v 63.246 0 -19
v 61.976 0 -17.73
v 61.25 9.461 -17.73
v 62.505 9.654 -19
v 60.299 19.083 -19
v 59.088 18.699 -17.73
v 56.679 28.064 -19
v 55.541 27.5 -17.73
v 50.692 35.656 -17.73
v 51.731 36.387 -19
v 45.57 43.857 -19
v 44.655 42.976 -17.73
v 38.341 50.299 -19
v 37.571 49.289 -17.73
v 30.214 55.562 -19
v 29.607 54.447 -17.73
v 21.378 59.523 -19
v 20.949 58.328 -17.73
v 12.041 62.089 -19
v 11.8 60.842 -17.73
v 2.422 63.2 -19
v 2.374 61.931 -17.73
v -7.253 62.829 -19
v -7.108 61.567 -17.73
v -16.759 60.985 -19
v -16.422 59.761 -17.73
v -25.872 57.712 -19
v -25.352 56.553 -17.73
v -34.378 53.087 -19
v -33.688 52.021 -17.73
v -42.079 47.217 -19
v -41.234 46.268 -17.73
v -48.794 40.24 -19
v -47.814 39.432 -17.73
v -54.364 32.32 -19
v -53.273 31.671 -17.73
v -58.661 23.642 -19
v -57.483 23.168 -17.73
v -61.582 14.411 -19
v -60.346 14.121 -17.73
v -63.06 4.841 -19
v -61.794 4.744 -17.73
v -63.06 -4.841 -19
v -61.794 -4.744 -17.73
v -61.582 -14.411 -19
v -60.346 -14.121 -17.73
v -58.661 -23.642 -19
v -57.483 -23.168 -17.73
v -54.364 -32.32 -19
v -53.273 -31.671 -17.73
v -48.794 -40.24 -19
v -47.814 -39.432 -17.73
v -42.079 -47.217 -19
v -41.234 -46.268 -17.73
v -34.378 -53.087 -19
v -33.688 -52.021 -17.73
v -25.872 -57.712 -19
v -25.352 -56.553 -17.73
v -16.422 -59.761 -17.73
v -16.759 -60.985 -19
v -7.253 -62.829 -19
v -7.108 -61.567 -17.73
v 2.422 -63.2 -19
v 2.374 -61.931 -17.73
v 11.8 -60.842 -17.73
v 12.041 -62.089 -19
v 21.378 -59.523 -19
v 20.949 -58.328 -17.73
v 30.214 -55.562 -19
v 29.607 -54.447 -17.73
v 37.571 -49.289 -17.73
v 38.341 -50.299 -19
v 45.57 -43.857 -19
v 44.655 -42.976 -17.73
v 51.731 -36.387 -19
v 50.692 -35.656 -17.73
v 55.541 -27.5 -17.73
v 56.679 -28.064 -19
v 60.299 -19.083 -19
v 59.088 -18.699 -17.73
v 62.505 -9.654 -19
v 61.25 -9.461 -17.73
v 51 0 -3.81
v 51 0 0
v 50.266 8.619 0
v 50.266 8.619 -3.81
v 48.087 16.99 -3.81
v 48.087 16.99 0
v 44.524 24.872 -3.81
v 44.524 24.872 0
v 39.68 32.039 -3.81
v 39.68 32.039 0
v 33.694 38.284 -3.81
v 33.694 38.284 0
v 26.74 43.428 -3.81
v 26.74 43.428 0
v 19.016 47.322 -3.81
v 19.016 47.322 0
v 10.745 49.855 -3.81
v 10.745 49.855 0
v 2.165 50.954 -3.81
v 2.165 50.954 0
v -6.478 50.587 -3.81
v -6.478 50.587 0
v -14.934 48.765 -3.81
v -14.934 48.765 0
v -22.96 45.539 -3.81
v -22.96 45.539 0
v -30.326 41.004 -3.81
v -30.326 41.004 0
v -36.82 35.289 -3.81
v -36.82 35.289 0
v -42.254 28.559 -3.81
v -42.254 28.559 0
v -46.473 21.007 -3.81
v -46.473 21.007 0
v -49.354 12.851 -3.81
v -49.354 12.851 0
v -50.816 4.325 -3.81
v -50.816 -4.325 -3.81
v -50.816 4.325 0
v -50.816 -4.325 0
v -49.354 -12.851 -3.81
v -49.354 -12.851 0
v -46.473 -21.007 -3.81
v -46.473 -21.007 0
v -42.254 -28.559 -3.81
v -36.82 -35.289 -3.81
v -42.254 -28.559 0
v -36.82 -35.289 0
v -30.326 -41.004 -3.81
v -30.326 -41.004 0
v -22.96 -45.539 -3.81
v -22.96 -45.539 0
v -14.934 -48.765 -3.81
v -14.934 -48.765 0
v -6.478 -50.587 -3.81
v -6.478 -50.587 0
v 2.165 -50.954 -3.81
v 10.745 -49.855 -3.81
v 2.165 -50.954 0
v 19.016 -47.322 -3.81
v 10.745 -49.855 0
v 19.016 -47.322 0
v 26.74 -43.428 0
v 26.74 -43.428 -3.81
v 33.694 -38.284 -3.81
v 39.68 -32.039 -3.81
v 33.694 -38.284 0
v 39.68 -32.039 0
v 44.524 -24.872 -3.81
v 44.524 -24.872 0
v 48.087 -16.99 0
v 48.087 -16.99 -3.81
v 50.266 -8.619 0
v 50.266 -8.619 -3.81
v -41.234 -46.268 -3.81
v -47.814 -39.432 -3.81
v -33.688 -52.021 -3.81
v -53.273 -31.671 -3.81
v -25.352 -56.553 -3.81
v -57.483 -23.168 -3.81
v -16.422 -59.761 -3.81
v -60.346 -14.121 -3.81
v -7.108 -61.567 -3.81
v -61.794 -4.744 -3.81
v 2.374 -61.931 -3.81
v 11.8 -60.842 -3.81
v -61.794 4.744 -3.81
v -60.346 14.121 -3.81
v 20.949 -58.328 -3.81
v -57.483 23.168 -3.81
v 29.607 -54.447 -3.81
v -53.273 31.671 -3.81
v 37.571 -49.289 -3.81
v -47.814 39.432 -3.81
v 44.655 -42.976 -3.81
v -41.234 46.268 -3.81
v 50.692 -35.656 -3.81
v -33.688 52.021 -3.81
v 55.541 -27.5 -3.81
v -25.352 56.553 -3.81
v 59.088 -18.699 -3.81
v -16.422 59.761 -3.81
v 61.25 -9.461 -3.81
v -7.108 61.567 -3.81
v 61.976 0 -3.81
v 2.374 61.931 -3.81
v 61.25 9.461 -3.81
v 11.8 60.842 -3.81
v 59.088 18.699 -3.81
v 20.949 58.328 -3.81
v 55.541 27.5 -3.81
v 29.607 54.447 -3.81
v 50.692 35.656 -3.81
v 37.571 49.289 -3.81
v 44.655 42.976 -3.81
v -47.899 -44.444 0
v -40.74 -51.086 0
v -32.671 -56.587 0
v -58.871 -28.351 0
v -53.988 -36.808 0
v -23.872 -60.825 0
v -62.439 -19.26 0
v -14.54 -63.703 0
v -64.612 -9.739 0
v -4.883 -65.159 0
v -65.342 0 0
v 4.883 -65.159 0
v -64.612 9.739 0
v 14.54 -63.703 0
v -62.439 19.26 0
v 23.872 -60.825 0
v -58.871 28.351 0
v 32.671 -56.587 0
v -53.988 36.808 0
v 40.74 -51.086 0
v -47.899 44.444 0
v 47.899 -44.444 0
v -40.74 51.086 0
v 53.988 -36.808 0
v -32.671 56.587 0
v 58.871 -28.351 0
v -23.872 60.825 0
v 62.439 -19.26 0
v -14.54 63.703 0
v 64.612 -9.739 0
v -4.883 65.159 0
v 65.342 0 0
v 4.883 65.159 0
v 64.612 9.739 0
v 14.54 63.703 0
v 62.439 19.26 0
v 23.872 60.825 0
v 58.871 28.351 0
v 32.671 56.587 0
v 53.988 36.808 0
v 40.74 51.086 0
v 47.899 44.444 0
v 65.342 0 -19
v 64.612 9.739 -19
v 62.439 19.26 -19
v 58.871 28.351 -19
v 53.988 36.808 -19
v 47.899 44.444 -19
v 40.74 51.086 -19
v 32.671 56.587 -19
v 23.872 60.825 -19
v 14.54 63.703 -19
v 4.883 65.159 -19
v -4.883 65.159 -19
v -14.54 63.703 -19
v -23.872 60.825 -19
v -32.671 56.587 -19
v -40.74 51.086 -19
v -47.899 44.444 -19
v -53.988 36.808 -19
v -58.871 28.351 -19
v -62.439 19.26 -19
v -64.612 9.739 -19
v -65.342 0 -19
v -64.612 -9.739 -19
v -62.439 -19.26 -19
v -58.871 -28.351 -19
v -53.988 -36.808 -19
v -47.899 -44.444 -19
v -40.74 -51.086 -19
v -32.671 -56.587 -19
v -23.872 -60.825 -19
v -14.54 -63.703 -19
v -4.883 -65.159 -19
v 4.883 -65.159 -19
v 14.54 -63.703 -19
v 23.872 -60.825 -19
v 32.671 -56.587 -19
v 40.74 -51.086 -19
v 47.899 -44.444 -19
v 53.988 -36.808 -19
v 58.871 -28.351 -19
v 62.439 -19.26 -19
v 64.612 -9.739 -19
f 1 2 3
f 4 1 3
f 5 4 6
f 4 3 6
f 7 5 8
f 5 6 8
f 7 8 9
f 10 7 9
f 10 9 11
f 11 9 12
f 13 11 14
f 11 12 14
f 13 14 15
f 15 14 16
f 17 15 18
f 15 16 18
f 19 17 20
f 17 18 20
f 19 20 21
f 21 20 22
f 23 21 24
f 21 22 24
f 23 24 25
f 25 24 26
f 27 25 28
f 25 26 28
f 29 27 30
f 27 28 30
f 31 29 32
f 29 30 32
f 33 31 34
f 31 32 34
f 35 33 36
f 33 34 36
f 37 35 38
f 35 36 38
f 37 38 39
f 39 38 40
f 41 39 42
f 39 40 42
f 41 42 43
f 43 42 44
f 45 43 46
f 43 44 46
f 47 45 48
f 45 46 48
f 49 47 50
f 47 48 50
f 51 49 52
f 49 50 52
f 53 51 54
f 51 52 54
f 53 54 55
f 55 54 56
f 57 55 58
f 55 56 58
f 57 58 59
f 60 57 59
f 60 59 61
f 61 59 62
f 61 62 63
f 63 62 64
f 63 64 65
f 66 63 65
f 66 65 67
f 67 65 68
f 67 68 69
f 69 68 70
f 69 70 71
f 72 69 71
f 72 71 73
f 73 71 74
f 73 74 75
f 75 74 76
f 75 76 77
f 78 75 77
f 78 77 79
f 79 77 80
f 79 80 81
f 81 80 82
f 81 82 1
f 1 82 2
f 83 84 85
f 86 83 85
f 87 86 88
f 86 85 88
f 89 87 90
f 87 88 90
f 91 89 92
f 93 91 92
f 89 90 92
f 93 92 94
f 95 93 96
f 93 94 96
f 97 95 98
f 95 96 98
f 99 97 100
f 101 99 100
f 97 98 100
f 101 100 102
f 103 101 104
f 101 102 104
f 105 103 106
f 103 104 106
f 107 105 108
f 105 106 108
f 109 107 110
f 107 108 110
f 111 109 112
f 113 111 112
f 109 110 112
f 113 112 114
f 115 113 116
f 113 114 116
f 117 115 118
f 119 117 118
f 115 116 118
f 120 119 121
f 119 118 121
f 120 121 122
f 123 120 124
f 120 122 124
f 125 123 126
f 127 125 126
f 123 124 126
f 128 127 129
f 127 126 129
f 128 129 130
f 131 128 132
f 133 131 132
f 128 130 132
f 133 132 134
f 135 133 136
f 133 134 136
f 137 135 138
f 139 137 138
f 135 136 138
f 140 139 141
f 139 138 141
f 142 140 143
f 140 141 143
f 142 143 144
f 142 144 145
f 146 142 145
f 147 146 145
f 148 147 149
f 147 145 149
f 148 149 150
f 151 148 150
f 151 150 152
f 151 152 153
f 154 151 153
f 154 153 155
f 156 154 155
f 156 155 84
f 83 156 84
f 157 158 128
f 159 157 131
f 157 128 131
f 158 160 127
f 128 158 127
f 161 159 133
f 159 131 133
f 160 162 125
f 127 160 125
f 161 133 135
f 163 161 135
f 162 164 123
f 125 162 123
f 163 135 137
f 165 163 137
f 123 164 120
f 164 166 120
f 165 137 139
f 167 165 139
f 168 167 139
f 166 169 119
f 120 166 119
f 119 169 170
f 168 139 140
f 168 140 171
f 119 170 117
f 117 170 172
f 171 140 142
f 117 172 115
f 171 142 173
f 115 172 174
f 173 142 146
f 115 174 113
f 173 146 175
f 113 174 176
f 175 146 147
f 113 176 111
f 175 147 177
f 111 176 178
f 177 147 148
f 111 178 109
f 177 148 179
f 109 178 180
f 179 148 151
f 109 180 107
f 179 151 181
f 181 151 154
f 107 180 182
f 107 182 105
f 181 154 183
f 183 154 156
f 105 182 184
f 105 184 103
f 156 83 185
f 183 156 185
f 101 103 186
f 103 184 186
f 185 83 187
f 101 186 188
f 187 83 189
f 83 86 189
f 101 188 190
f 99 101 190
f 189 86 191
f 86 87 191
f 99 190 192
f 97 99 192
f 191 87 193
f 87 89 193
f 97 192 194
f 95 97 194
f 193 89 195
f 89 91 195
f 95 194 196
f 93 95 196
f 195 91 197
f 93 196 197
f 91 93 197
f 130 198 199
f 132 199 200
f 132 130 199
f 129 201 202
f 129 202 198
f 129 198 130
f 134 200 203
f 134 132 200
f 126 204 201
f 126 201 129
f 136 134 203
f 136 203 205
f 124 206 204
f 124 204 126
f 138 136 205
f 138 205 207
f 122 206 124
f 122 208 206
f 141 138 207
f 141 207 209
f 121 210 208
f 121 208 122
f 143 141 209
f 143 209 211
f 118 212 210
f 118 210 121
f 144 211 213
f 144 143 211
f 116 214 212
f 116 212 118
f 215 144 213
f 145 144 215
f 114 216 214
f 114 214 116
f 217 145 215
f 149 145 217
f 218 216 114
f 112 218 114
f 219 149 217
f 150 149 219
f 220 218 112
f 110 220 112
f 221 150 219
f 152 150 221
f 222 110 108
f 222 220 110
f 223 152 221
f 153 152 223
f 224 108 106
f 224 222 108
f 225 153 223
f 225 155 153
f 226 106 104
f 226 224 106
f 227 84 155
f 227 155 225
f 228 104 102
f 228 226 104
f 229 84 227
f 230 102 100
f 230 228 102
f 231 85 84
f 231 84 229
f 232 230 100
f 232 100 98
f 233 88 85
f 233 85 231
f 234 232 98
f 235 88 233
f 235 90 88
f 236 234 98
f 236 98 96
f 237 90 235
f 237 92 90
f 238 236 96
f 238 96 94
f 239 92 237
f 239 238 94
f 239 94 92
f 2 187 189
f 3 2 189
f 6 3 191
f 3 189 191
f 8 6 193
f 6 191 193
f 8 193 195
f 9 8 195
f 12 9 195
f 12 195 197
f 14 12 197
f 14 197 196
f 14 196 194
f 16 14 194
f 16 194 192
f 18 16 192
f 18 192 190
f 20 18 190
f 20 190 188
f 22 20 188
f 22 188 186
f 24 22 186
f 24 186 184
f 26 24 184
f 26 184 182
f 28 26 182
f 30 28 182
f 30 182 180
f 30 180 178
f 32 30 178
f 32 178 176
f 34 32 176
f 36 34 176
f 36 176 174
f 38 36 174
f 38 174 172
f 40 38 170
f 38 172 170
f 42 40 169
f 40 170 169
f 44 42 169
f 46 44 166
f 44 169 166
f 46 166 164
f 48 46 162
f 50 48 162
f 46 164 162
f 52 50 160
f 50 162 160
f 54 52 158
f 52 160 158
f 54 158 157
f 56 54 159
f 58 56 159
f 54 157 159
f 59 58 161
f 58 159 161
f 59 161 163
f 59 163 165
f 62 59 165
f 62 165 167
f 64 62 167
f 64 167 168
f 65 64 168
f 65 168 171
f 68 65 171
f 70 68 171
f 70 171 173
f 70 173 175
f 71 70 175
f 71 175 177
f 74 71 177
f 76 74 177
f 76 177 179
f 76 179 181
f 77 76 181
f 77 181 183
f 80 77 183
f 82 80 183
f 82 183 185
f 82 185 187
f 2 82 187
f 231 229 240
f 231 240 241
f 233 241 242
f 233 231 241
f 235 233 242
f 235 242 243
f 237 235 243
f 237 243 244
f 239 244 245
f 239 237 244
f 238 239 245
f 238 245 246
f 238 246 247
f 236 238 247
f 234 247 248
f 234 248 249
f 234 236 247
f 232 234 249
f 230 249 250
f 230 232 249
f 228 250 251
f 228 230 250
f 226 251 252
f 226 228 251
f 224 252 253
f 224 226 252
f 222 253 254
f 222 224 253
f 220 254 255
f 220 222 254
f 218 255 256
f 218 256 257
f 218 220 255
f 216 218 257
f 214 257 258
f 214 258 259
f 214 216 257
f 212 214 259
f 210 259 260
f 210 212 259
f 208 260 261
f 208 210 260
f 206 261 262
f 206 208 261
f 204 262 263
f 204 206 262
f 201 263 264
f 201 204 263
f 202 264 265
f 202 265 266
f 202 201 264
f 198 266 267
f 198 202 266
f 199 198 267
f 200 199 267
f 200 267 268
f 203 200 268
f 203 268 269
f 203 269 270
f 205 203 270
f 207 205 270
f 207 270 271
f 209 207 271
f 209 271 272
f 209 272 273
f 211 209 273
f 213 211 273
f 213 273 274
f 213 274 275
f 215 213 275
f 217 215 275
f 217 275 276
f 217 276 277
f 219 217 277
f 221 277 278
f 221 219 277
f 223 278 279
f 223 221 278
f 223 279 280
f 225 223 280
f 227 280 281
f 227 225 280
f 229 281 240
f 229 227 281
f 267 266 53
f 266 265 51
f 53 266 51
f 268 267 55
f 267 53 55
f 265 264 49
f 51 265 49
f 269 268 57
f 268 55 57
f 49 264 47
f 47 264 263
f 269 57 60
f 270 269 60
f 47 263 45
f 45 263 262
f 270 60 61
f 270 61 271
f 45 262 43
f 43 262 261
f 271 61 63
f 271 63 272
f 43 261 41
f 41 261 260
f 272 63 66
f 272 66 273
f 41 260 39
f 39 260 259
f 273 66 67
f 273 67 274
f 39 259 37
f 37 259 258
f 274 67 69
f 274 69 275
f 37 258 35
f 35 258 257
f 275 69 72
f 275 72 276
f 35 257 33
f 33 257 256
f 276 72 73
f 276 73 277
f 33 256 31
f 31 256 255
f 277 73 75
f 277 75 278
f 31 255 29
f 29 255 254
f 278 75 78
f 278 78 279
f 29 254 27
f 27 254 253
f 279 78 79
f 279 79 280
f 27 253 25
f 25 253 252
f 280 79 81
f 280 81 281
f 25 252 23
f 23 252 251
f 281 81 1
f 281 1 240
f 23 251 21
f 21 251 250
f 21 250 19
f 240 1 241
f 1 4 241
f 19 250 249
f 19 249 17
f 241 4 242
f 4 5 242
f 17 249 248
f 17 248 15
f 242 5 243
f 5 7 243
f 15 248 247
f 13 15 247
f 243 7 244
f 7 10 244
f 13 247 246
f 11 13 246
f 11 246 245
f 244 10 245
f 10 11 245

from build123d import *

# Parameters (mm, degrees)
F0_R     = 64.77
F0_R_2   = 51
F1_DEPTH = 3.81
F2_R     = 65.3415
F2_R_2   = 61.976
F3_DEPTH = 19
F4_SIZE  = 1.27


with BuildPart() as f1:
    # F0 (on Top) → F1 (new body)
    with BuildSketch(Plane.XY):
        Circle(F0_R)
        Circle(F0_R_2, mode=Mode.SUBTRACT)
    extrude(amount=-F1_DEPTH)

    # F2 (on face) → F3 (join)
    with BuildSketch(Plane.XY):
        Circle(F2_R)
        Circle(F2_R_2, mode=Mode.SUBTRACT)
    extrude(amount=-F3_DEPTH)

    # F4
    f4_edges = [f1.edges().sort_by_distance(p)[0] for p in [
        (-61.976, 0, -19),
    ]]
    chamfer(f4_edges, length=F4_SIZE)


solid = f1.part
